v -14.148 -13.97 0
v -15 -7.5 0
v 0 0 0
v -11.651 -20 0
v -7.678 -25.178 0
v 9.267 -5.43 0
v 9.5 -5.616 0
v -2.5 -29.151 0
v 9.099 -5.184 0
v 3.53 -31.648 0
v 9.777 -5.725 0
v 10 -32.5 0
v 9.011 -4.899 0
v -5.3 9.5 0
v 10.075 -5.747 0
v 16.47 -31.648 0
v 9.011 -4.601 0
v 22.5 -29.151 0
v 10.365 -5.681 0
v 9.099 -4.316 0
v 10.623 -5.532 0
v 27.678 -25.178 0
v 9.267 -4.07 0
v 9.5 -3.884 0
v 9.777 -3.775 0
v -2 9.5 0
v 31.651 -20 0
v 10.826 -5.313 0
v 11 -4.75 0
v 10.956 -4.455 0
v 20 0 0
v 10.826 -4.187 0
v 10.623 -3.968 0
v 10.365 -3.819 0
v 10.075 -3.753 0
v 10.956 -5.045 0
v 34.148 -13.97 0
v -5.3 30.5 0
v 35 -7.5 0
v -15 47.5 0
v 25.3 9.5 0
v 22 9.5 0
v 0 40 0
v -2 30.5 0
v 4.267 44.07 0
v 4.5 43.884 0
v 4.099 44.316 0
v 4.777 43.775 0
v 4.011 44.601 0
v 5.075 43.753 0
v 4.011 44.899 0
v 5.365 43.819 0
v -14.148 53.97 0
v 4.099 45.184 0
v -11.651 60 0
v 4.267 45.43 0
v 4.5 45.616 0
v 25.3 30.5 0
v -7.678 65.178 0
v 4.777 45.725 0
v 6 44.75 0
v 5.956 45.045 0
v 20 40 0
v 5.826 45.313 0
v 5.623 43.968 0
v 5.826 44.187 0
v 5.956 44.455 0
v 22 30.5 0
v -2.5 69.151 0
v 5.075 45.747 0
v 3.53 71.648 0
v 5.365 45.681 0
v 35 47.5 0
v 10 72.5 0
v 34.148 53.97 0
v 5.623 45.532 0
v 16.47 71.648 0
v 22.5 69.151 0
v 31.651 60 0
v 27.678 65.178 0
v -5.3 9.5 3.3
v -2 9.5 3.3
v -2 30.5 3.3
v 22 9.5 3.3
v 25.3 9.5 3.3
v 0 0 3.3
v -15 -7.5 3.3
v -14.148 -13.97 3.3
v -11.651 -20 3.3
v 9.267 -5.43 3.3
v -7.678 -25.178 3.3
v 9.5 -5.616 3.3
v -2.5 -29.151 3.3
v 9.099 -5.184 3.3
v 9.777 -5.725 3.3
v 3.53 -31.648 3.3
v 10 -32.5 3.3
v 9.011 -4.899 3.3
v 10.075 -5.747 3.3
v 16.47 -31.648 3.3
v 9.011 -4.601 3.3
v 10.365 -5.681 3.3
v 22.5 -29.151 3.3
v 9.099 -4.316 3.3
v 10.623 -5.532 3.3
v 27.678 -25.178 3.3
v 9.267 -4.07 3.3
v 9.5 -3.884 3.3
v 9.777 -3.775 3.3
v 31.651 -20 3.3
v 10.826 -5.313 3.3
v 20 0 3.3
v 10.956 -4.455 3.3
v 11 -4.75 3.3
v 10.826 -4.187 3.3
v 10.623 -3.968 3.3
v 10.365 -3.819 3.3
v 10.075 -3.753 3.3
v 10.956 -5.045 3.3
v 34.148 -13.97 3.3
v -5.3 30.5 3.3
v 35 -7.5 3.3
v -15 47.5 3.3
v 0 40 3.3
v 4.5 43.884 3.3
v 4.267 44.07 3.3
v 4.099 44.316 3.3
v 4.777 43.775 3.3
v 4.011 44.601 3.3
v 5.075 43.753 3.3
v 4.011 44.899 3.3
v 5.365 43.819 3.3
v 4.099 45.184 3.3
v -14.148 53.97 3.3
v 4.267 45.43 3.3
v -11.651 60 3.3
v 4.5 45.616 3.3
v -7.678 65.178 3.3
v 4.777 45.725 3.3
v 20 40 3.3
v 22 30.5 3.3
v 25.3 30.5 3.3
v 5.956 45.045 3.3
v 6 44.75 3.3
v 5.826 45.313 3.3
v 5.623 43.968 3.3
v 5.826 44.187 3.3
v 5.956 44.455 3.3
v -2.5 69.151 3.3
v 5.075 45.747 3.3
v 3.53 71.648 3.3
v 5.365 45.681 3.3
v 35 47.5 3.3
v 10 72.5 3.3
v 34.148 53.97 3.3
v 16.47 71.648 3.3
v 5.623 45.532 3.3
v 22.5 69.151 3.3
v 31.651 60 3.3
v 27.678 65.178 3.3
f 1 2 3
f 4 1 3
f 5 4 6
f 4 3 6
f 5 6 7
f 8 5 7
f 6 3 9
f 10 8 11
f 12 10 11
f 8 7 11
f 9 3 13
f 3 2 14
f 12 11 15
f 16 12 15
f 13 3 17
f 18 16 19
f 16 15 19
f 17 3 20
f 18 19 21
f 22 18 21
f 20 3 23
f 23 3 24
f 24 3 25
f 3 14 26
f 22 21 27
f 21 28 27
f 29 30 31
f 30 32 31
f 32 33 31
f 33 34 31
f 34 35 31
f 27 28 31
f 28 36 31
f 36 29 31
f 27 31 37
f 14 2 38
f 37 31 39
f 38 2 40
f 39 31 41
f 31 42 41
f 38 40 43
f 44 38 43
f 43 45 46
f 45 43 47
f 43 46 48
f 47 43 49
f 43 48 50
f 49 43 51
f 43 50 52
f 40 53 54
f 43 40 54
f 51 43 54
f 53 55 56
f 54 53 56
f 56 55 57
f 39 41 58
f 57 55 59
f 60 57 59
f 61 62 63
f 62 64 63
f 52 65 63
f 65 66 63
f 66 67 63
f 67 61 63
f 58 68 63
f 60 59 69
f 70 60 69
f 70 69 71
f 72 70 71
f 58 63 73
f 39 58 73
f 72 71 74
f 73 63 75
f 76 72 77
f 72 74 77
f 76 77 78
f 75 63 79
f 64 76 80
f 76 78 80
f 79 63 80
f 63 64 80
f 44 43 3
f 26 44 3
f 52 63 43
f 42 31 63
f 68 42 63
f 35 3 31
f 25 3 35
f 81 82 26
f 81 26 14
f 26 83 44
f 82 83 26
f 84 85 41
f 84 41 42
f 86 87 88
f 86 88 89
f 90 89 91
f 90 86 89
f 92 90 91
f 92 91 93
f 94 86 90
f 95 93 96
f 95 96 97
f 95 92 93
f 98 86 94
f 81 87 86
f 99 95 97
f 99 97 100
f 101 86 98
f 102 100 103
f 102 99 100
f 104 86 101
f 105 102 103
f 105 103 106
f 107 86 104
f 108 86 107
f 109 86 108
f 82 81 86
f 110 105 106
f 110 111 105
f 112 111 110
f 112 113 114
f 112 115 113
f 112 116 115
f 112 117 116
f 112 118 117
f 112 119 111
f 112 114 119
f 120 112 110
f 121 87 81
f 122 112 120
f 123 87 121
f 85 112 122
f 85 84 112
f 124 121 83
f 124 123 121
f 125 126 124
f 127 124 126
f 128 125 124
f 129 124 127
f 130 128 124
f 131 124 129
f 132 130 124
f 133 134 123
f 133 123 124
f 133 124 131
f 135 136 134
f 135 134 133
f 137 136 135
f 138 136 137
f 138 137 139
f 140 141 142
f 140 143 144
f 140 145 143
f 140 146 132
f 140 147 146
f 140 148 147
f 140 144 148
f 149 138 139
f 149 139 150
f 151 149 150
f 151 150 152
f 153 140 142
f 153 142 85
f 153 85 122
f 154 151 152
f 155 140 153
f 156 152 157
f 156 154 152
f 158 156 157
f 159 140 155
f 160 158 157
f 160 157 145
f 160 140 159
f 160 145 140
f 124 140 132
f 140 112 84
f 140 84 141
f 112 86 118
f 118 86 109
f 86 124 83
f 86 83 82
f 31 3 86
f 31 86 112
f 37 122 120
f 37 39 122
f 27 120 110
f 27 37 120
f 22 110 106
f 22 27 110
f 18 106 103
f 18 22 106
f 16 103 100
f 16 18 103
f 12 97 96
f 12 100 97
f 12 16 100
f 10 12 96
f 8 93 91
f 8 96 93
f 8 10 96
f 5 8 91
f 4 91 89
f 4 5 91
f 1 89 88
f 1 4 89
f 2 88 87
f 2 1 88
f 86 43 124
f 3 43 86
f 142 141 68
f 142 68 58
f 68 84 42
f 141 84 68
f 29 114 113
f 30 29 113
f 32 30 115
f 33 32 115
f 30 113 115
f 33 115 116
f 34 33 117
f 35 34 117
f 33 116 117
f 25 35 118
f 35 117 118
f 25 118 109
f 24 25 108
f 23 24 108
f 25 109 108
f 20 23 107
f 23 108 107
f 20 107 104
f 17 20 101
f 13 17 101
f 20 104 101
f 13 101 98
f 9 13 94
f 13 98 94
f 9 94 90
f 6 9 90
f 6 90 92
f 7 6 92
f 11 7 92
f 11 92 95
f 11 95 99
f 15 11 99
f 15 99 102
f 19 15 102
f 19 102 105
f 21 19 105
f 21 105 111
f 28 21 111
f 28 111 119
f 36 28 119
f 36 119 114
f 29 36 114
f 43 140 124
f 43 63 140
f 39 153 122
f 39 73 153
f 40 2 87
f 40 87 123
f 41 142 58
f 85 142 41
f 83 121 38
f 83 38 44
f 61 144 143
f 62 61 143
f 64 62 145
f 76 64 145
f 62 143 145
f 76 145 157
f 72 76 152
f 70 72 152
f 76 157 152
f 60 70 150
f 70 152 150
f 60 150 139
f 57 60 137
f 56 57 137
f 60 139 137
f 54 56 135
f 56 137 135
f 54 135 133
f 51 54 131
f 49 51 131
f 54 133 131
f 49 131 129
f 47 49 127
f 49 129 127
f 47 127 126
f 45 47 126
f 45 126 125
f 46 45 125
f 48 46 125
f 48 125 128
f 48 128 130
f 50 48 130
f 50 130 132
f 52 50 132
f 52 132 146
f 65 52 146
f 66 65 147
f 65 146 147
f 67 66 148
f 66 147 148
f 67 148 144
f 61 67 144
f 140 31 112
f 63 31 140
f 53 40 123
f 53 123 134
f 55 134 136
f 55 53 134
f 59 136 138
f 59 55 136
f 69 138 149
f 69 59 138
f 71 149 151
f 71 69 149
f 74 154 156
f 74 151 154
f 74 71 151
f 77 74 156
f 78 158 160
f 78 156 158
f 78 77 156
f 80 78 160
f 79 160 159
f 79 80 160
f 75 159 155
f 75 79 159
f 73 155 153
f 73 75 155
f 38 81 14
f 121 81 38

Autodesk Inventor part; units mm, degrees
ref_plane "YZ Plane" through (0, 0, 0) normal (1, 0, 0) x (0, 1, 0)
ref_plane "XZ Plane" through (0, 0, 0) normal (0, 1, 0) x (-1, 0, 0)
ref_plane "XY Plane" through (0, 0, 0) normal (0, 0, 1) x (1, 0, 0)
sketch "Sketch1" plane through (0, 0, 0) normal (0, 0, 1) x (1, 0, 0)
  line L0 (0, 0) -> (20, 0)
  line L1 (20, 0) -> (20, 40)
  line L2 (20, 40) -> (0, 40)
  line L3 (0, 40) -> (0, 0)
  line L4 (-15, -7.5) -> (-15, 47.5)
  line L5 (35, 47.5) -> (35, -7.5)
  arc A0 (35, 47.5) -> (-15, 47.5) centre (10, 47.5) ccw
  arc A1 (-15, -7.5) -> (35, -7.5) centre (10, -7.5) ccw
  dimension "base_servo" = 20
  dimension "altura_servo" = 40
  dimension "d2" = 15
  dimension "d3" = 15
  dimension "d4" = 55
  dimension "d5" = 55
  dimension "d9" = 7.5
extrude "Extrusion1" add sketch "Sketch1" along normal blind 3.3
sketch "Sketch2" plane through (0, 0, 3.3) normal (0, 0, 1) x (1, 0, 0)
  line L0 (22, 30.5) -> (25.3, 30.5)
  line L1 (25.3, 30.5) -> (25.3, 9.5)
  line L2 (25.3, 9.5) -> (22, 9.5)
  line L3 (22, 9.5) -> (22, 30.5)
  line L4 (-5.3, 30.5) -> (-2, 30.5)
  line L5 (-2, 30.5) -> (-2, 9.5)
  line L6 (-2, 9.5) -> (-5.3, 9.5)
  line L7 (-5.3, 9.5) -> (-5.3, 30.5)
  line L8 (0, 0) -> (0, 40) projected
  line L9 (20, 40) -> (20, 0) projected
  dimension "d12" = 3.3
  dimension "d13" = 3.3
  dimension "d14" = 21
  dimension "d16" = 9.5
  dimension "d17" = 2
  dimension "d18" = 2
extrude "Extrusion2" cut sketch "Sketch2" against normal blind 3.3
sketch "Sketch3" plane through (0, 0, 3.3) normal (0, 0, 1) x (1, 0, 0)
  circle A0 centre (5, 44.75) radius 1
  line L0 (0, 40) -> (20, 40) projected
  circle A1 centre (10, -4.75) radius 1
  line L1 (20, 0) -> (0, 0) projected
  circle A2 centre (15, 44.75) radius 1
  dimension "agujero_servo" = 2
  dimension "distancia_agujero_servo" = 4.75
  dimension "d23" = 5
  dimension "d24" = 10
  dimension "d25" = 4.75
  dimension "d28" = 4.75
  dimension "d29" = 10
extrude "Extrusion3" cut sketch "Sketch3" against normal blind 3.3 contours A0 | A1
equation "\"d3\" = d2"
equation "\"d5\" = d4"
equation "\"d9\" = 0.5 * d4 - 0.5 * altura_servo"
equation "\"d10\" = d12"
equation "\"d13\" = d12"
equation "\"d16\" = 0.5 * altura_servo - 0.5 * d14"
equation "\"d18\" = d17"
equation "\"d19\" = d12"
equation "\"d23\" = 0.25 * base_servo"
equation "\"d24\" = 0.5 * base_servo"
equation "\"d25\" = distancia_agujero_servo"
equation "\"d28\" = distancia_agujero_servo"
properties part number "soporte servo base"
